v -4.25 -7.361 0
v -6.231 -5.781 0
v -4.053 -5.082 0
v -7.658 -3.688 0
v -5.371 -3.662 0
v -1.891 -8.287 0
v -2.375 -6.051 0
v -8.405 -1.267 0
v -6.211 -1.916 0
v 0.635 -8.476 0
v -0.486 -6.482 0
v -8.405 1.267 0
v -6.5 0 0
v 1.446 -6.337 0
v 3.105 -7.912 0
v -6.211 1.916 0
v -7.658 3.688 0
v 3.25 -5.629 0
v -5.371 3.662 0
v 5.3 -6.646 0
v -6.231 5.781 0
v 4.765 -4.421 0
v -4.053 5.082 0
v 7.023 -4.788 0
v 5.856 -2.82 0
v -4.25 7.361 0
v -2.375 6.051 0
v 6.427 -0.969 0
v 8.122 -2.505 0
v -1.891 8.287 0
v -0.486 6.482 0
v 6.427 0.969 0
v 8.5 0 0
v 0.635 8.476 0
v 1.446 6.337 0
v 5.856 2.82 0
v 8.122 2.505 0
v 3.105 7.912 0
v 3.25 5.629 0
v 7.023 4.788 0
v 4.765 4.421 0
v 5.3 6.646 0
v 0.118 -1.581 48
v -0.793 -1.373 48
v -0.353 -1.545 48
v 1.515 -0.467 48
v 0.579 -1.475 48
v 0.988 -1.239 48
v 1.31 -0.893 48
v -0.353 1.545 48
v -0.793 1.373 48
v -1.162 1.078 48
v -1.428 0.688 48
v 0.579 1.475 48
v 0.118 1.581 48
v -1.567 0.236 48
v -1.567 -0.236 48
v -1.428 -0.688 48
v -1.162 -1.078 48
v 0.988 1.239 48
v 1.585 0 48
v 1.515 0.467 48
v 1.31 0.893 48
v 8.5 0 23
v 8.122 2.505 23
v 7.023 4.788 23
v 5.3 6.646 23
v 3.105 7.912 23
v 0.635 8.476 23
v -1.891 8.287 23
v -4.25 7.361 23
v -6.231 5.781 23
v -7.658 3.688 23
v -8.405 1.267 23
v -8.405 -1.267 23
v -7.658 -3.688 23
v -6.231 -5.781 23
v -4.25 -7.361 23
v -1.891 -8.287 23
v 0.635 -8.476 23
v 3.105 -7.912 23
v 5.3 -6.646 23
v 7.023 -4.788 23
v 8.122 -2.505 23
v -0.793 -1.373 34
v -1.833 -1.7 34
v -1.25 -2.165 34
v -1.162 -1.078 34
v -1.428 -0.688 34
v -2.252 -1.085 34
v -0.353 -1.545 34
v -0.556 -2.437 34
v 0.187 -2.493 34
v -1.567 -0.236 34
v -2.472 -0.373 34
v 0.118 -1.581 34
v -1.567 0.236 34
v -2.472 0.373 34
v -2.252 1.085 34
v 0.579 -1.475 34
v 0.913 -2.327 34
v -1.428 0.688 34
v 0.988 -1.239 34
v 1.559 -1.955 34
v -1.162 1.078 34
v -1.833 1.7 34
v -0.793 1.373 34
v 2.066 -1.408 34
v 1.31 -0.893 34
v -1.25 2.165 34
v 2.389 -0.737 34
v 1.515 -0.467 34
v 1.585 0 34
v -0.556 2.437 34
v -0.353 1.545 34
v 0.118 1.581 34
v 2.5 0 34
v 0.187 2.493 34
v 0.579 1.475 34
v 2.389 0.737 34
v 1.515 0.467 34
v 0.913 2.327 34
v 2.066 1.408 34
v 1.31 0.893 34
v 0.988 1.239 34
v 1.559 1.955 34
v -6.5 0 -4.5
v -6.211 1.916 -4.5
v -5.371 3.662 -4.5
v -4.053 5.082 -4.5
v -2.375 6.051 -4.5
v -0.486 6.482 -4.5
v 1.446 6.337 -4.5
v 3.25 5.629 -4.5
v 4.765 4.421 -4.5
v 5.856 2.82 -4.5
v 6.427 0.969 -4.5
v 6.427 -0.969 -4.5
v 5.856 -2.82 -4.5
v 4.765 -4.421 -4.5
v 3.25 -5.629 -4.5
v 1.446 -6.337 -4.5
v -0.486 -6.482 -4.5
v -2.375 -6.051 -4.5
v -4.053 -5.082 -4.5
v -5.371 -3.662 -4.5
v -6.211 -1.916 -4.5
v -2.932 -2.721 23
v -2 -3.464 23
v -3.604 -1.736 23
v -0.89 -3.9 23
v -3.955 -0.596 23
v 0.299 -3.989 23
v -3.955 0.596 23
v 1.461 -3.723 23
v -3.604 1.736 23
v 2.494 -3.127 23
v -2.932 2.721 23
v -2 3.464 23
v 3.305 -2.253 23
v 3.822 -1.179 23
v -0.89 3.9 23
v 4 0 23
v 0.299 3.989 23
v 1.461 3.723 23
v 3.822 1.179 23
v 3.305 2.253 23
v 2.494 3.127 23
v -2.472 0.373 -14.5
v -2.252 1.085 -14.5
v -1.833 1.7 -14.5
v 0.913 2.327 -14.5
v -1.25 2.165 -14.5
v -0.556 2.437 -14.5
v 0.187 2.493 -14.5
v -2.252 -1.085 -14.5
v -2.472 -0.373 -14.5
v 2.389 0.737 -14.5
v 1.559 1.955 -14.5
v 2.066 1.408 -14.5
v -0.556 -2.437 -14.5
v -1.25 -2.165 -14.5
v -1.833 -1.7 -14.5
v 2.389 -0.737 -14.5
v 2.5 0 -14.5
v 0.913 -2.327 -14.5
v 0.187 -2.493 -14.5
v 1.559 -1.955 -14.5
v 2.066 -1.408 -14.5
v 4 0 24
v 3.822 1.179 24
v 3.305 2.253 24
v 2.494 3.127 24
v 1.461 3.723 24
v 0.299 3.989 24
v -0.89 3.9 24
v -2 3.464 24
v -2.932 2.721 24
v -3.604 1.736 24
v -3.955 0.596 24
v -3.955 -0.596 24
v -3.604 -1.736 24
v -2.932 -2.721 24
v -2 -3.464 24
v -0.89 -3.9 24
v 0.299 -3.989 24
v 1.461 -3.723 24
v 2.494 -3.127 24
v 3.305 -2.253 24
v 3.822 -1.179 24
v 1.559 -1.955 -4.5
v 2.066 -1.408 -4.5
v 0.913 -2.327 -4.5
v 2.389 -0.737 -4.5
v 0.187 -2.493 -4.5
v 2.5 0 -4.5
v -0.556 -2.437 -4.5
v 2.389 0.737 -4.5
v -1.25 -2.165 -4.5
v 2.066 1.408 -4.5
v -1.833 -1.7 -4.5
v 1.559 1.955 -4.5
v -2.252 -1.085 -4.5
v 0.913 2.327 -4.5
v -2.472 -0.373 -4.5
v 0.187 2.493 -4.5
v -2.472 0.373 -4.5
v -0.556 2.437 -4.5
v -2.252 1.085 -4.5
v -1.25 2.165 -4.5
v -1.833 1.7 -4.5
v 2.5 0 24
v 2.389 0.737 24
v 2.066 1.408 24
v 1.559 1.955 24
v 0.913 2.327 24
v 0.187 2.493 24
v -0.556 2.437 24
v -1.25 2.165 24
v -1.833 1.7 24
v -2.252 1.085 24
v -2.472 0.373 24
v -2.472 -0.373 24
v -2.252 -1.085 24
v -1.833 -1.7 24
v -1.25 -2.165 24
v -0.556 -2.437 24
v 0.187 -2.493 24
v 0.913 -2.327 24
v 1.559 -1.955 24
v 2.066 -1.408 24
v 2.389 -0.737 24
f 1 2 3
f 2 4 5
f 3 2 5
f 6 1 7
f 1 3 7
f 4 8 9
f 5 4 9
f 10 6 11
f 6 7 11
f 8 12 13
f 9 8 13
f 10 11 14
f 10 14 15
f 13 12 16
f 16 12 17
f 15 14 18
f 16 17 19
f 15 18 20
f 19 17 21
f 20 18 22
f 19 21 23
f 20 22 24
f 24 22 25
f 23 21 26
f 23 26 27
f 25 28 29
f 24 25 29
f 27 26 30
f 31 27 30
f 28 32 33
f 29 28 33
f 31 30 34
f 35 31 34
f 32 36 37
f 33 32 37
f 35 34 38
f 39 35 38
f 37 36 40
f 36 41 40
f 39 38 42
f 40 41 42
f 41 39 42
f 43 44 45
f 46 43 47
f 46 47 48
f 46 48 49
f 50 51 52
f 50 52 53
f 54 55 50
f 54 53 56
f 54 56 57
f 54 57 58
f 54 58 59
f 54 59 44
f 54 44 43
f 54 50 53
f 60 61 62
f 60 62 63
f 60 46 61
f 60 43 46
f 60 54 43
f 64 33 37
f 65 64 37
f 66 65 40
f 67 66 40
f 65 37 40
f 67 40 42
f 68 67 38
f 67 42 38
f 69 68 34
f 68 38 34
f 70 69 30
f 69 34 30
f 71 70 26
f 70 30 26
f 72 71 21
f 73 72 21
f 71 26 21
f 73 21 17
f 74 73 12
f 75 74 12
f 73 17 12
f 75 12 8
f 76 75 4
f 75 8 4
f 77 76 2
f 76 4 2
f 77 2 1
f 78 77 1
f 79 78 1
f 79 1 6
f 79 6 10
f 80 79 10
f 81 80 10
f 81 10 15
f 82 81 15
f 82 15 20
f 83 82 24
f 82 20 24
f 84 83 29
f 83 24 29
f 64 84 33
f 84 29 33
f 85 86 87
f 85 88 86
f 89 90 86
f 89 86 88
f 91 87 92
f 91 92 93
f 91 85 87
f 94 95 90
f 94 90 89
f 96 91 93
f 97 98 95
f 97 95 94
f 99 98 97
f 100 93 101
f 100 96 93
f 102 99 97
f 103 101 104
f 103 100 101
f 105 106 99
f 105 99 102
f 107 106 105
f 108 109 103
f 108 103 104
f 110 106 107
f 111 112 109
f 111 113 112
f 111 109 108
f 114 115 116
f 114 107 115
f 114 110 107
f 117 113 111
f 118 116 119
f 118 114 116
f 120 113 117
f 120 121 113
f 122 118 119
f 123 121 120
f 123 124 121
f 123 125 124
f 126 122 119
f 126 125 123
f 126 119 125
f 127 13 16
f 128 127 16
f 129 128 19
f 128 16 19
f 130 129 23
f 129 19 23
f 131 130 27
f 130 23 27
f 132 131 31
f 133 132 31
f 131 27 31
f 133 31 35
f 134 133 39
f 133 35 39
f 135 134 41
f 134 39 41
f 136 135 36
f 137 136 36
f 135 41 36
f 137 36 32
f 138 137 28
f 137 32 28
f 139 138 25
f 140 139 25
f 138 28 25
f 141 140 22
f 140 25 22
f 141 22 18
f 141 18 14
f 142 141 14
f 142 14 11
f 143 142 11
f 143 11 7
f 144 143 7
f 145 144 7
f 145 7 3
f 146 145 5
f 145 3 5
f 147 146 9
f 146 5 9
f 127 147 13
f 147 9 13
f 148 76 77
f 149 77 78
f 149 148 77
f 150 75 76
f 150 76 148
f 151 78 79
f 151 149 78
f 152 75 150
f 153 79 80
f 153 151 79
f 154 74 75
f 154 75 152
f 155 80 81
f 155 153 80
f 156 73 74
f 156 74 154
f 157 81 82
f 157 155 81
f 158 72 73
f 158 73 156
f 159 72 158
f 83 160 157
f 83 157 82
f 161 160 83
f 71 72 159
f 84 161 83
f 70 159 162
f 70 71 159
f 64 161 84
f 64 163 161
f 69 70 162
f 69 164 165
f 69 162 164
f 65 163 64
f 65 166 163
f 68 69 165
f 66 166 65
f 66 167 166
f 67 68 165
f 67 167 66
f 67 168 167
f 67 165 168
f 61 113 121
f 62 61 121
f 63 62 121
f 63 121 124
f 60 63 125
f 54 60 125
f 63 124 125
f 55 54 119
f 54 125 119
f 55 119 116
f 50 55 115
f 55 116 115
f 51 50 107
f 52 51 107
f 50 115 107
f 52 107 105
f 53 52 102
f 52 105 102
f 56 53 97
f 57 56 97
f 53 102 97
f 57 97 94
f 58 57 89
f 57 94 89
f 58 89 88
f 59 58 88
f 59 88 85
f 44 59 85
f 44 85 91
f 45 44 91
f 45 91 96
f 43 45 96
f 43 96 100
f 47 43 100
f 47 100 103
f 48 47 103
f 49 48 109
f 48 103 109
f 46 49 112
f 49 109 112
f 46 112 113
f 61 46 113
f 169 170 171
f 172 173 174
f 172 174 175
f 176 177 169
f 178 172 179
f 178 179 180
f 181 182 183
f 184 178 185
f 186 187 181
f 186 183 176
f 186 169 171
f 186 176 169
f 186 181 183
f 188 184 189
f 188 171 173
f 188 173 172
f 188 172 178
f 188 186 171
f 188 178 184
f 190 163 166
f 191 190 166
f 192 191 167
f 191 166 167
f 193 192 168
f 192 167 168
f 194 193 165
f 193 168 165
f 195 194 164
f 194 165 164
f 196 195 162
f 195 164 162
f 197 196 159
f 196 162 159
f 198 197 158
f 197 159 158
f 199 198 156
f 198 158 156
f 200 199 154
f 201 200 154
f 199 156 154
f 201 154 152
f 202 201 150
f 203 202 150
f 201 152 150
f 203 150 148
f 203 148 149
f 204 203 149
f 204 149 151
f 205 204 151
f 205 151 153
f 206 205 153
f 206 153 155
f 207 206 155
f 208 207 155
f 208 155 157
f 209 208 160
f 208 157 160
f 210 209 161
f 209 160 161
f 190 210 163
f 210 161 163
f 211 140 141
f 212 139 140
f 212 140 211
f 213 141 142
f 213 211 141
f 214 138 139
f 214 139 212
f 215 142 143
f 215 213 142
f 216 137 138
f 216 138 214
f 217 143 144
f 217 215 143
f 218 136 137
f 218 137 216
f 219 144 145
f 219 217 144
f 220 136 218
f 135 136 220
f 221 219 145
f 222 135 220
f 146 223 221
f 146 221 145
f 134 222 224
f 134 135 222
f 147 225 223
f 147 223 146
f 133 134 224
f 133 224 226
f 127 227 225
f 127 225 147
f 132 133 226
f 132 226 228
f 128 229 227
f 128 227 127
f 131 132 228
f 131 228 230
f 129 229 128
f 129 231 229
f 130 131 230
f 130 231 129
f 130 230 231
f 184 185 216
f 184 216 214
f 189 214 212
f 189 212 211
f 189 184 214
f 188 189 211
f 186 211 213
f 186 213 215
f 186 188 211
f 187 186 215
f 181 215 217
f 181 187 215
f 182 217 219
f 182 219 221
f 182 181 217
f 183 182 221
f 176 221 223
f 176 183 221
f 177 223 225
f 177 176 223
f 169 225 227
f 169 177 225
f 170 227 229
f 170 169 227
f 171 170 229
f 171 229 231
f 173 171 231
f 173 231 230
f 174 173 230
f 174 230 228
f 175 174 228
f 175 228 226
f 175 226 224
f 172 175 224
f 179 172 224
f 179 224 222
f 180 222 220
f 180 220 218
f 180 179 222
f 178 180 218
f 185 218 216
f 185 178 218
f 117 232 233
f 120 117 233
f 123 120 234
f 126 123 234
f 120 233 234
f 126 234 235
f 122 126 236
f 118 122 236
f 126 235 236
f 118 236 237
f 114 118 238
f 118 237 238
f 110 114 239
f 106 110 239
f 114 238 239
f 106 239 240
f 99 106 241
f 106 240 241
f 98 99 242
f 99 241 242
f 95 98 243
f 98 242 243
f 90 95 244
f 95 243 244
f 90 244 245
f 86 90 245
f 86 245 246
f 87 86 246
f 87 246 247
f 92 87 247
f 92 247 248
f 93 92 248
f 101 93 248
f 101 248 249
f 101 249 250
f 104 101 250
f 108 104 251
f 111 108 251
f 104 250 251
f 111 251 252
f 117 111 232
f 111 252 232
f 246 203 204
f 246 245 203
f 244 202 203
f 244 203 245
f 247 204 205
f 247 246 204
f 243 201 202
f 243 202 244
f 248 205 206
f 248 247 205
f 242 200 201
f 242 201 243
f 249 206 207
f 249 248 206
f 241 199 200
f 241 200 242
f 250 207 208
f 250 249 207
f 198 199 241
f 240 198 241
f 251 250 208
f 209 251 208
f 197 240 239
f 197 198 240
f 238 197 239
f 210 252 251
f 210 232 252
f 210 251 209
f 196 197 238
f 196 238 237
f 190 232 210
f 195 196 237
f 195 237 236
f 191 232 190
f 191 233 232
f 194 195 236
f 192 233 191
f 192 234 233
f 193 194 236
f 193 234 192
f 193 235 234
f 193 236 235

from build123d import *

# Parameters (mm, degrees)
SKETCH1_R           = 8.5
BOSS_EXTRUDE1_DEPTH = 23
SKETCH2_R           = 4
BOSS_EXTRUDE2_DEPTH = 1
SKETCH3_R           = 2.5
BOSS_EXTRUDE3_DEPTH = 10
SKETCH4_R           = 6.5
BOSS_EXTRUDE4_DEPTH = 4.5
BOSS_EXTRUDE5_START = 10
SKETCH5_R           = 2.5
BOSS_EXTRUDE5_DEPTH = 10
SKETCH7_R           = 1.585
BOSS_EXTRUDE6_DEPTH = 14


with BuildPart() as part:
    # Sketch1 → Boss-Extrude1 (new body)
    with BuildSketch(Plane.XY):
        Circle(SKETCH1_R)
    extrude(amount=BOSS_EXTRUDE1_DEPTH)

    # Sketch2 → Boss-Extrude2 (add)
    with BuildSketch(Plane.XY.offset(23)):
        Circle(SKETCH2_R)
    extrude(amount=BOSS_EXTRUDE2_DEPTH)

    # Sketch3 → Boss-Extrude3 (add)
    with BuildSketch(Plane.XY.offset(24)):
        Circle(SKETCH3_R)
    extrude(amount=BOSS_EXTRUDE3_DEPTH)

    # Sketch4 → Boss-Extrude4 (add)
    with BuildSketch(Plane(origin=(0, 0, 0), x_dir=(-1, 0, 0), z_dir=(0, 0, -1))):
        Circle(SKETCH4_R)
    extrude(amount=BOSS_EXTRUDE4_DEPTH)

    # Sketch5 → Boss-Extrude5 (add)
    with BuildSketch(Plane(origin=(0, 0, -4.5), x_dir=(-1, 0, 0), z_dir=(0, 0, -1)).offset(BOSS_EXTRUDE5_START)):
        with Locations(Location((0, 0, 0), (0, 0, 180))):
            Circle(SKETCH5_R)
    extrude(amount=-BOSS_EXTRUDE5_DEPTH)

    # Sketch7 → Boss-Extrude6 (add)
    with BuildSketch(Plane.XY.offset(34)):
        Circle(SKETCH7_R)
    extrude(amount=BOSS_EXTRUDE6_DEPTH)


solid = part.part
